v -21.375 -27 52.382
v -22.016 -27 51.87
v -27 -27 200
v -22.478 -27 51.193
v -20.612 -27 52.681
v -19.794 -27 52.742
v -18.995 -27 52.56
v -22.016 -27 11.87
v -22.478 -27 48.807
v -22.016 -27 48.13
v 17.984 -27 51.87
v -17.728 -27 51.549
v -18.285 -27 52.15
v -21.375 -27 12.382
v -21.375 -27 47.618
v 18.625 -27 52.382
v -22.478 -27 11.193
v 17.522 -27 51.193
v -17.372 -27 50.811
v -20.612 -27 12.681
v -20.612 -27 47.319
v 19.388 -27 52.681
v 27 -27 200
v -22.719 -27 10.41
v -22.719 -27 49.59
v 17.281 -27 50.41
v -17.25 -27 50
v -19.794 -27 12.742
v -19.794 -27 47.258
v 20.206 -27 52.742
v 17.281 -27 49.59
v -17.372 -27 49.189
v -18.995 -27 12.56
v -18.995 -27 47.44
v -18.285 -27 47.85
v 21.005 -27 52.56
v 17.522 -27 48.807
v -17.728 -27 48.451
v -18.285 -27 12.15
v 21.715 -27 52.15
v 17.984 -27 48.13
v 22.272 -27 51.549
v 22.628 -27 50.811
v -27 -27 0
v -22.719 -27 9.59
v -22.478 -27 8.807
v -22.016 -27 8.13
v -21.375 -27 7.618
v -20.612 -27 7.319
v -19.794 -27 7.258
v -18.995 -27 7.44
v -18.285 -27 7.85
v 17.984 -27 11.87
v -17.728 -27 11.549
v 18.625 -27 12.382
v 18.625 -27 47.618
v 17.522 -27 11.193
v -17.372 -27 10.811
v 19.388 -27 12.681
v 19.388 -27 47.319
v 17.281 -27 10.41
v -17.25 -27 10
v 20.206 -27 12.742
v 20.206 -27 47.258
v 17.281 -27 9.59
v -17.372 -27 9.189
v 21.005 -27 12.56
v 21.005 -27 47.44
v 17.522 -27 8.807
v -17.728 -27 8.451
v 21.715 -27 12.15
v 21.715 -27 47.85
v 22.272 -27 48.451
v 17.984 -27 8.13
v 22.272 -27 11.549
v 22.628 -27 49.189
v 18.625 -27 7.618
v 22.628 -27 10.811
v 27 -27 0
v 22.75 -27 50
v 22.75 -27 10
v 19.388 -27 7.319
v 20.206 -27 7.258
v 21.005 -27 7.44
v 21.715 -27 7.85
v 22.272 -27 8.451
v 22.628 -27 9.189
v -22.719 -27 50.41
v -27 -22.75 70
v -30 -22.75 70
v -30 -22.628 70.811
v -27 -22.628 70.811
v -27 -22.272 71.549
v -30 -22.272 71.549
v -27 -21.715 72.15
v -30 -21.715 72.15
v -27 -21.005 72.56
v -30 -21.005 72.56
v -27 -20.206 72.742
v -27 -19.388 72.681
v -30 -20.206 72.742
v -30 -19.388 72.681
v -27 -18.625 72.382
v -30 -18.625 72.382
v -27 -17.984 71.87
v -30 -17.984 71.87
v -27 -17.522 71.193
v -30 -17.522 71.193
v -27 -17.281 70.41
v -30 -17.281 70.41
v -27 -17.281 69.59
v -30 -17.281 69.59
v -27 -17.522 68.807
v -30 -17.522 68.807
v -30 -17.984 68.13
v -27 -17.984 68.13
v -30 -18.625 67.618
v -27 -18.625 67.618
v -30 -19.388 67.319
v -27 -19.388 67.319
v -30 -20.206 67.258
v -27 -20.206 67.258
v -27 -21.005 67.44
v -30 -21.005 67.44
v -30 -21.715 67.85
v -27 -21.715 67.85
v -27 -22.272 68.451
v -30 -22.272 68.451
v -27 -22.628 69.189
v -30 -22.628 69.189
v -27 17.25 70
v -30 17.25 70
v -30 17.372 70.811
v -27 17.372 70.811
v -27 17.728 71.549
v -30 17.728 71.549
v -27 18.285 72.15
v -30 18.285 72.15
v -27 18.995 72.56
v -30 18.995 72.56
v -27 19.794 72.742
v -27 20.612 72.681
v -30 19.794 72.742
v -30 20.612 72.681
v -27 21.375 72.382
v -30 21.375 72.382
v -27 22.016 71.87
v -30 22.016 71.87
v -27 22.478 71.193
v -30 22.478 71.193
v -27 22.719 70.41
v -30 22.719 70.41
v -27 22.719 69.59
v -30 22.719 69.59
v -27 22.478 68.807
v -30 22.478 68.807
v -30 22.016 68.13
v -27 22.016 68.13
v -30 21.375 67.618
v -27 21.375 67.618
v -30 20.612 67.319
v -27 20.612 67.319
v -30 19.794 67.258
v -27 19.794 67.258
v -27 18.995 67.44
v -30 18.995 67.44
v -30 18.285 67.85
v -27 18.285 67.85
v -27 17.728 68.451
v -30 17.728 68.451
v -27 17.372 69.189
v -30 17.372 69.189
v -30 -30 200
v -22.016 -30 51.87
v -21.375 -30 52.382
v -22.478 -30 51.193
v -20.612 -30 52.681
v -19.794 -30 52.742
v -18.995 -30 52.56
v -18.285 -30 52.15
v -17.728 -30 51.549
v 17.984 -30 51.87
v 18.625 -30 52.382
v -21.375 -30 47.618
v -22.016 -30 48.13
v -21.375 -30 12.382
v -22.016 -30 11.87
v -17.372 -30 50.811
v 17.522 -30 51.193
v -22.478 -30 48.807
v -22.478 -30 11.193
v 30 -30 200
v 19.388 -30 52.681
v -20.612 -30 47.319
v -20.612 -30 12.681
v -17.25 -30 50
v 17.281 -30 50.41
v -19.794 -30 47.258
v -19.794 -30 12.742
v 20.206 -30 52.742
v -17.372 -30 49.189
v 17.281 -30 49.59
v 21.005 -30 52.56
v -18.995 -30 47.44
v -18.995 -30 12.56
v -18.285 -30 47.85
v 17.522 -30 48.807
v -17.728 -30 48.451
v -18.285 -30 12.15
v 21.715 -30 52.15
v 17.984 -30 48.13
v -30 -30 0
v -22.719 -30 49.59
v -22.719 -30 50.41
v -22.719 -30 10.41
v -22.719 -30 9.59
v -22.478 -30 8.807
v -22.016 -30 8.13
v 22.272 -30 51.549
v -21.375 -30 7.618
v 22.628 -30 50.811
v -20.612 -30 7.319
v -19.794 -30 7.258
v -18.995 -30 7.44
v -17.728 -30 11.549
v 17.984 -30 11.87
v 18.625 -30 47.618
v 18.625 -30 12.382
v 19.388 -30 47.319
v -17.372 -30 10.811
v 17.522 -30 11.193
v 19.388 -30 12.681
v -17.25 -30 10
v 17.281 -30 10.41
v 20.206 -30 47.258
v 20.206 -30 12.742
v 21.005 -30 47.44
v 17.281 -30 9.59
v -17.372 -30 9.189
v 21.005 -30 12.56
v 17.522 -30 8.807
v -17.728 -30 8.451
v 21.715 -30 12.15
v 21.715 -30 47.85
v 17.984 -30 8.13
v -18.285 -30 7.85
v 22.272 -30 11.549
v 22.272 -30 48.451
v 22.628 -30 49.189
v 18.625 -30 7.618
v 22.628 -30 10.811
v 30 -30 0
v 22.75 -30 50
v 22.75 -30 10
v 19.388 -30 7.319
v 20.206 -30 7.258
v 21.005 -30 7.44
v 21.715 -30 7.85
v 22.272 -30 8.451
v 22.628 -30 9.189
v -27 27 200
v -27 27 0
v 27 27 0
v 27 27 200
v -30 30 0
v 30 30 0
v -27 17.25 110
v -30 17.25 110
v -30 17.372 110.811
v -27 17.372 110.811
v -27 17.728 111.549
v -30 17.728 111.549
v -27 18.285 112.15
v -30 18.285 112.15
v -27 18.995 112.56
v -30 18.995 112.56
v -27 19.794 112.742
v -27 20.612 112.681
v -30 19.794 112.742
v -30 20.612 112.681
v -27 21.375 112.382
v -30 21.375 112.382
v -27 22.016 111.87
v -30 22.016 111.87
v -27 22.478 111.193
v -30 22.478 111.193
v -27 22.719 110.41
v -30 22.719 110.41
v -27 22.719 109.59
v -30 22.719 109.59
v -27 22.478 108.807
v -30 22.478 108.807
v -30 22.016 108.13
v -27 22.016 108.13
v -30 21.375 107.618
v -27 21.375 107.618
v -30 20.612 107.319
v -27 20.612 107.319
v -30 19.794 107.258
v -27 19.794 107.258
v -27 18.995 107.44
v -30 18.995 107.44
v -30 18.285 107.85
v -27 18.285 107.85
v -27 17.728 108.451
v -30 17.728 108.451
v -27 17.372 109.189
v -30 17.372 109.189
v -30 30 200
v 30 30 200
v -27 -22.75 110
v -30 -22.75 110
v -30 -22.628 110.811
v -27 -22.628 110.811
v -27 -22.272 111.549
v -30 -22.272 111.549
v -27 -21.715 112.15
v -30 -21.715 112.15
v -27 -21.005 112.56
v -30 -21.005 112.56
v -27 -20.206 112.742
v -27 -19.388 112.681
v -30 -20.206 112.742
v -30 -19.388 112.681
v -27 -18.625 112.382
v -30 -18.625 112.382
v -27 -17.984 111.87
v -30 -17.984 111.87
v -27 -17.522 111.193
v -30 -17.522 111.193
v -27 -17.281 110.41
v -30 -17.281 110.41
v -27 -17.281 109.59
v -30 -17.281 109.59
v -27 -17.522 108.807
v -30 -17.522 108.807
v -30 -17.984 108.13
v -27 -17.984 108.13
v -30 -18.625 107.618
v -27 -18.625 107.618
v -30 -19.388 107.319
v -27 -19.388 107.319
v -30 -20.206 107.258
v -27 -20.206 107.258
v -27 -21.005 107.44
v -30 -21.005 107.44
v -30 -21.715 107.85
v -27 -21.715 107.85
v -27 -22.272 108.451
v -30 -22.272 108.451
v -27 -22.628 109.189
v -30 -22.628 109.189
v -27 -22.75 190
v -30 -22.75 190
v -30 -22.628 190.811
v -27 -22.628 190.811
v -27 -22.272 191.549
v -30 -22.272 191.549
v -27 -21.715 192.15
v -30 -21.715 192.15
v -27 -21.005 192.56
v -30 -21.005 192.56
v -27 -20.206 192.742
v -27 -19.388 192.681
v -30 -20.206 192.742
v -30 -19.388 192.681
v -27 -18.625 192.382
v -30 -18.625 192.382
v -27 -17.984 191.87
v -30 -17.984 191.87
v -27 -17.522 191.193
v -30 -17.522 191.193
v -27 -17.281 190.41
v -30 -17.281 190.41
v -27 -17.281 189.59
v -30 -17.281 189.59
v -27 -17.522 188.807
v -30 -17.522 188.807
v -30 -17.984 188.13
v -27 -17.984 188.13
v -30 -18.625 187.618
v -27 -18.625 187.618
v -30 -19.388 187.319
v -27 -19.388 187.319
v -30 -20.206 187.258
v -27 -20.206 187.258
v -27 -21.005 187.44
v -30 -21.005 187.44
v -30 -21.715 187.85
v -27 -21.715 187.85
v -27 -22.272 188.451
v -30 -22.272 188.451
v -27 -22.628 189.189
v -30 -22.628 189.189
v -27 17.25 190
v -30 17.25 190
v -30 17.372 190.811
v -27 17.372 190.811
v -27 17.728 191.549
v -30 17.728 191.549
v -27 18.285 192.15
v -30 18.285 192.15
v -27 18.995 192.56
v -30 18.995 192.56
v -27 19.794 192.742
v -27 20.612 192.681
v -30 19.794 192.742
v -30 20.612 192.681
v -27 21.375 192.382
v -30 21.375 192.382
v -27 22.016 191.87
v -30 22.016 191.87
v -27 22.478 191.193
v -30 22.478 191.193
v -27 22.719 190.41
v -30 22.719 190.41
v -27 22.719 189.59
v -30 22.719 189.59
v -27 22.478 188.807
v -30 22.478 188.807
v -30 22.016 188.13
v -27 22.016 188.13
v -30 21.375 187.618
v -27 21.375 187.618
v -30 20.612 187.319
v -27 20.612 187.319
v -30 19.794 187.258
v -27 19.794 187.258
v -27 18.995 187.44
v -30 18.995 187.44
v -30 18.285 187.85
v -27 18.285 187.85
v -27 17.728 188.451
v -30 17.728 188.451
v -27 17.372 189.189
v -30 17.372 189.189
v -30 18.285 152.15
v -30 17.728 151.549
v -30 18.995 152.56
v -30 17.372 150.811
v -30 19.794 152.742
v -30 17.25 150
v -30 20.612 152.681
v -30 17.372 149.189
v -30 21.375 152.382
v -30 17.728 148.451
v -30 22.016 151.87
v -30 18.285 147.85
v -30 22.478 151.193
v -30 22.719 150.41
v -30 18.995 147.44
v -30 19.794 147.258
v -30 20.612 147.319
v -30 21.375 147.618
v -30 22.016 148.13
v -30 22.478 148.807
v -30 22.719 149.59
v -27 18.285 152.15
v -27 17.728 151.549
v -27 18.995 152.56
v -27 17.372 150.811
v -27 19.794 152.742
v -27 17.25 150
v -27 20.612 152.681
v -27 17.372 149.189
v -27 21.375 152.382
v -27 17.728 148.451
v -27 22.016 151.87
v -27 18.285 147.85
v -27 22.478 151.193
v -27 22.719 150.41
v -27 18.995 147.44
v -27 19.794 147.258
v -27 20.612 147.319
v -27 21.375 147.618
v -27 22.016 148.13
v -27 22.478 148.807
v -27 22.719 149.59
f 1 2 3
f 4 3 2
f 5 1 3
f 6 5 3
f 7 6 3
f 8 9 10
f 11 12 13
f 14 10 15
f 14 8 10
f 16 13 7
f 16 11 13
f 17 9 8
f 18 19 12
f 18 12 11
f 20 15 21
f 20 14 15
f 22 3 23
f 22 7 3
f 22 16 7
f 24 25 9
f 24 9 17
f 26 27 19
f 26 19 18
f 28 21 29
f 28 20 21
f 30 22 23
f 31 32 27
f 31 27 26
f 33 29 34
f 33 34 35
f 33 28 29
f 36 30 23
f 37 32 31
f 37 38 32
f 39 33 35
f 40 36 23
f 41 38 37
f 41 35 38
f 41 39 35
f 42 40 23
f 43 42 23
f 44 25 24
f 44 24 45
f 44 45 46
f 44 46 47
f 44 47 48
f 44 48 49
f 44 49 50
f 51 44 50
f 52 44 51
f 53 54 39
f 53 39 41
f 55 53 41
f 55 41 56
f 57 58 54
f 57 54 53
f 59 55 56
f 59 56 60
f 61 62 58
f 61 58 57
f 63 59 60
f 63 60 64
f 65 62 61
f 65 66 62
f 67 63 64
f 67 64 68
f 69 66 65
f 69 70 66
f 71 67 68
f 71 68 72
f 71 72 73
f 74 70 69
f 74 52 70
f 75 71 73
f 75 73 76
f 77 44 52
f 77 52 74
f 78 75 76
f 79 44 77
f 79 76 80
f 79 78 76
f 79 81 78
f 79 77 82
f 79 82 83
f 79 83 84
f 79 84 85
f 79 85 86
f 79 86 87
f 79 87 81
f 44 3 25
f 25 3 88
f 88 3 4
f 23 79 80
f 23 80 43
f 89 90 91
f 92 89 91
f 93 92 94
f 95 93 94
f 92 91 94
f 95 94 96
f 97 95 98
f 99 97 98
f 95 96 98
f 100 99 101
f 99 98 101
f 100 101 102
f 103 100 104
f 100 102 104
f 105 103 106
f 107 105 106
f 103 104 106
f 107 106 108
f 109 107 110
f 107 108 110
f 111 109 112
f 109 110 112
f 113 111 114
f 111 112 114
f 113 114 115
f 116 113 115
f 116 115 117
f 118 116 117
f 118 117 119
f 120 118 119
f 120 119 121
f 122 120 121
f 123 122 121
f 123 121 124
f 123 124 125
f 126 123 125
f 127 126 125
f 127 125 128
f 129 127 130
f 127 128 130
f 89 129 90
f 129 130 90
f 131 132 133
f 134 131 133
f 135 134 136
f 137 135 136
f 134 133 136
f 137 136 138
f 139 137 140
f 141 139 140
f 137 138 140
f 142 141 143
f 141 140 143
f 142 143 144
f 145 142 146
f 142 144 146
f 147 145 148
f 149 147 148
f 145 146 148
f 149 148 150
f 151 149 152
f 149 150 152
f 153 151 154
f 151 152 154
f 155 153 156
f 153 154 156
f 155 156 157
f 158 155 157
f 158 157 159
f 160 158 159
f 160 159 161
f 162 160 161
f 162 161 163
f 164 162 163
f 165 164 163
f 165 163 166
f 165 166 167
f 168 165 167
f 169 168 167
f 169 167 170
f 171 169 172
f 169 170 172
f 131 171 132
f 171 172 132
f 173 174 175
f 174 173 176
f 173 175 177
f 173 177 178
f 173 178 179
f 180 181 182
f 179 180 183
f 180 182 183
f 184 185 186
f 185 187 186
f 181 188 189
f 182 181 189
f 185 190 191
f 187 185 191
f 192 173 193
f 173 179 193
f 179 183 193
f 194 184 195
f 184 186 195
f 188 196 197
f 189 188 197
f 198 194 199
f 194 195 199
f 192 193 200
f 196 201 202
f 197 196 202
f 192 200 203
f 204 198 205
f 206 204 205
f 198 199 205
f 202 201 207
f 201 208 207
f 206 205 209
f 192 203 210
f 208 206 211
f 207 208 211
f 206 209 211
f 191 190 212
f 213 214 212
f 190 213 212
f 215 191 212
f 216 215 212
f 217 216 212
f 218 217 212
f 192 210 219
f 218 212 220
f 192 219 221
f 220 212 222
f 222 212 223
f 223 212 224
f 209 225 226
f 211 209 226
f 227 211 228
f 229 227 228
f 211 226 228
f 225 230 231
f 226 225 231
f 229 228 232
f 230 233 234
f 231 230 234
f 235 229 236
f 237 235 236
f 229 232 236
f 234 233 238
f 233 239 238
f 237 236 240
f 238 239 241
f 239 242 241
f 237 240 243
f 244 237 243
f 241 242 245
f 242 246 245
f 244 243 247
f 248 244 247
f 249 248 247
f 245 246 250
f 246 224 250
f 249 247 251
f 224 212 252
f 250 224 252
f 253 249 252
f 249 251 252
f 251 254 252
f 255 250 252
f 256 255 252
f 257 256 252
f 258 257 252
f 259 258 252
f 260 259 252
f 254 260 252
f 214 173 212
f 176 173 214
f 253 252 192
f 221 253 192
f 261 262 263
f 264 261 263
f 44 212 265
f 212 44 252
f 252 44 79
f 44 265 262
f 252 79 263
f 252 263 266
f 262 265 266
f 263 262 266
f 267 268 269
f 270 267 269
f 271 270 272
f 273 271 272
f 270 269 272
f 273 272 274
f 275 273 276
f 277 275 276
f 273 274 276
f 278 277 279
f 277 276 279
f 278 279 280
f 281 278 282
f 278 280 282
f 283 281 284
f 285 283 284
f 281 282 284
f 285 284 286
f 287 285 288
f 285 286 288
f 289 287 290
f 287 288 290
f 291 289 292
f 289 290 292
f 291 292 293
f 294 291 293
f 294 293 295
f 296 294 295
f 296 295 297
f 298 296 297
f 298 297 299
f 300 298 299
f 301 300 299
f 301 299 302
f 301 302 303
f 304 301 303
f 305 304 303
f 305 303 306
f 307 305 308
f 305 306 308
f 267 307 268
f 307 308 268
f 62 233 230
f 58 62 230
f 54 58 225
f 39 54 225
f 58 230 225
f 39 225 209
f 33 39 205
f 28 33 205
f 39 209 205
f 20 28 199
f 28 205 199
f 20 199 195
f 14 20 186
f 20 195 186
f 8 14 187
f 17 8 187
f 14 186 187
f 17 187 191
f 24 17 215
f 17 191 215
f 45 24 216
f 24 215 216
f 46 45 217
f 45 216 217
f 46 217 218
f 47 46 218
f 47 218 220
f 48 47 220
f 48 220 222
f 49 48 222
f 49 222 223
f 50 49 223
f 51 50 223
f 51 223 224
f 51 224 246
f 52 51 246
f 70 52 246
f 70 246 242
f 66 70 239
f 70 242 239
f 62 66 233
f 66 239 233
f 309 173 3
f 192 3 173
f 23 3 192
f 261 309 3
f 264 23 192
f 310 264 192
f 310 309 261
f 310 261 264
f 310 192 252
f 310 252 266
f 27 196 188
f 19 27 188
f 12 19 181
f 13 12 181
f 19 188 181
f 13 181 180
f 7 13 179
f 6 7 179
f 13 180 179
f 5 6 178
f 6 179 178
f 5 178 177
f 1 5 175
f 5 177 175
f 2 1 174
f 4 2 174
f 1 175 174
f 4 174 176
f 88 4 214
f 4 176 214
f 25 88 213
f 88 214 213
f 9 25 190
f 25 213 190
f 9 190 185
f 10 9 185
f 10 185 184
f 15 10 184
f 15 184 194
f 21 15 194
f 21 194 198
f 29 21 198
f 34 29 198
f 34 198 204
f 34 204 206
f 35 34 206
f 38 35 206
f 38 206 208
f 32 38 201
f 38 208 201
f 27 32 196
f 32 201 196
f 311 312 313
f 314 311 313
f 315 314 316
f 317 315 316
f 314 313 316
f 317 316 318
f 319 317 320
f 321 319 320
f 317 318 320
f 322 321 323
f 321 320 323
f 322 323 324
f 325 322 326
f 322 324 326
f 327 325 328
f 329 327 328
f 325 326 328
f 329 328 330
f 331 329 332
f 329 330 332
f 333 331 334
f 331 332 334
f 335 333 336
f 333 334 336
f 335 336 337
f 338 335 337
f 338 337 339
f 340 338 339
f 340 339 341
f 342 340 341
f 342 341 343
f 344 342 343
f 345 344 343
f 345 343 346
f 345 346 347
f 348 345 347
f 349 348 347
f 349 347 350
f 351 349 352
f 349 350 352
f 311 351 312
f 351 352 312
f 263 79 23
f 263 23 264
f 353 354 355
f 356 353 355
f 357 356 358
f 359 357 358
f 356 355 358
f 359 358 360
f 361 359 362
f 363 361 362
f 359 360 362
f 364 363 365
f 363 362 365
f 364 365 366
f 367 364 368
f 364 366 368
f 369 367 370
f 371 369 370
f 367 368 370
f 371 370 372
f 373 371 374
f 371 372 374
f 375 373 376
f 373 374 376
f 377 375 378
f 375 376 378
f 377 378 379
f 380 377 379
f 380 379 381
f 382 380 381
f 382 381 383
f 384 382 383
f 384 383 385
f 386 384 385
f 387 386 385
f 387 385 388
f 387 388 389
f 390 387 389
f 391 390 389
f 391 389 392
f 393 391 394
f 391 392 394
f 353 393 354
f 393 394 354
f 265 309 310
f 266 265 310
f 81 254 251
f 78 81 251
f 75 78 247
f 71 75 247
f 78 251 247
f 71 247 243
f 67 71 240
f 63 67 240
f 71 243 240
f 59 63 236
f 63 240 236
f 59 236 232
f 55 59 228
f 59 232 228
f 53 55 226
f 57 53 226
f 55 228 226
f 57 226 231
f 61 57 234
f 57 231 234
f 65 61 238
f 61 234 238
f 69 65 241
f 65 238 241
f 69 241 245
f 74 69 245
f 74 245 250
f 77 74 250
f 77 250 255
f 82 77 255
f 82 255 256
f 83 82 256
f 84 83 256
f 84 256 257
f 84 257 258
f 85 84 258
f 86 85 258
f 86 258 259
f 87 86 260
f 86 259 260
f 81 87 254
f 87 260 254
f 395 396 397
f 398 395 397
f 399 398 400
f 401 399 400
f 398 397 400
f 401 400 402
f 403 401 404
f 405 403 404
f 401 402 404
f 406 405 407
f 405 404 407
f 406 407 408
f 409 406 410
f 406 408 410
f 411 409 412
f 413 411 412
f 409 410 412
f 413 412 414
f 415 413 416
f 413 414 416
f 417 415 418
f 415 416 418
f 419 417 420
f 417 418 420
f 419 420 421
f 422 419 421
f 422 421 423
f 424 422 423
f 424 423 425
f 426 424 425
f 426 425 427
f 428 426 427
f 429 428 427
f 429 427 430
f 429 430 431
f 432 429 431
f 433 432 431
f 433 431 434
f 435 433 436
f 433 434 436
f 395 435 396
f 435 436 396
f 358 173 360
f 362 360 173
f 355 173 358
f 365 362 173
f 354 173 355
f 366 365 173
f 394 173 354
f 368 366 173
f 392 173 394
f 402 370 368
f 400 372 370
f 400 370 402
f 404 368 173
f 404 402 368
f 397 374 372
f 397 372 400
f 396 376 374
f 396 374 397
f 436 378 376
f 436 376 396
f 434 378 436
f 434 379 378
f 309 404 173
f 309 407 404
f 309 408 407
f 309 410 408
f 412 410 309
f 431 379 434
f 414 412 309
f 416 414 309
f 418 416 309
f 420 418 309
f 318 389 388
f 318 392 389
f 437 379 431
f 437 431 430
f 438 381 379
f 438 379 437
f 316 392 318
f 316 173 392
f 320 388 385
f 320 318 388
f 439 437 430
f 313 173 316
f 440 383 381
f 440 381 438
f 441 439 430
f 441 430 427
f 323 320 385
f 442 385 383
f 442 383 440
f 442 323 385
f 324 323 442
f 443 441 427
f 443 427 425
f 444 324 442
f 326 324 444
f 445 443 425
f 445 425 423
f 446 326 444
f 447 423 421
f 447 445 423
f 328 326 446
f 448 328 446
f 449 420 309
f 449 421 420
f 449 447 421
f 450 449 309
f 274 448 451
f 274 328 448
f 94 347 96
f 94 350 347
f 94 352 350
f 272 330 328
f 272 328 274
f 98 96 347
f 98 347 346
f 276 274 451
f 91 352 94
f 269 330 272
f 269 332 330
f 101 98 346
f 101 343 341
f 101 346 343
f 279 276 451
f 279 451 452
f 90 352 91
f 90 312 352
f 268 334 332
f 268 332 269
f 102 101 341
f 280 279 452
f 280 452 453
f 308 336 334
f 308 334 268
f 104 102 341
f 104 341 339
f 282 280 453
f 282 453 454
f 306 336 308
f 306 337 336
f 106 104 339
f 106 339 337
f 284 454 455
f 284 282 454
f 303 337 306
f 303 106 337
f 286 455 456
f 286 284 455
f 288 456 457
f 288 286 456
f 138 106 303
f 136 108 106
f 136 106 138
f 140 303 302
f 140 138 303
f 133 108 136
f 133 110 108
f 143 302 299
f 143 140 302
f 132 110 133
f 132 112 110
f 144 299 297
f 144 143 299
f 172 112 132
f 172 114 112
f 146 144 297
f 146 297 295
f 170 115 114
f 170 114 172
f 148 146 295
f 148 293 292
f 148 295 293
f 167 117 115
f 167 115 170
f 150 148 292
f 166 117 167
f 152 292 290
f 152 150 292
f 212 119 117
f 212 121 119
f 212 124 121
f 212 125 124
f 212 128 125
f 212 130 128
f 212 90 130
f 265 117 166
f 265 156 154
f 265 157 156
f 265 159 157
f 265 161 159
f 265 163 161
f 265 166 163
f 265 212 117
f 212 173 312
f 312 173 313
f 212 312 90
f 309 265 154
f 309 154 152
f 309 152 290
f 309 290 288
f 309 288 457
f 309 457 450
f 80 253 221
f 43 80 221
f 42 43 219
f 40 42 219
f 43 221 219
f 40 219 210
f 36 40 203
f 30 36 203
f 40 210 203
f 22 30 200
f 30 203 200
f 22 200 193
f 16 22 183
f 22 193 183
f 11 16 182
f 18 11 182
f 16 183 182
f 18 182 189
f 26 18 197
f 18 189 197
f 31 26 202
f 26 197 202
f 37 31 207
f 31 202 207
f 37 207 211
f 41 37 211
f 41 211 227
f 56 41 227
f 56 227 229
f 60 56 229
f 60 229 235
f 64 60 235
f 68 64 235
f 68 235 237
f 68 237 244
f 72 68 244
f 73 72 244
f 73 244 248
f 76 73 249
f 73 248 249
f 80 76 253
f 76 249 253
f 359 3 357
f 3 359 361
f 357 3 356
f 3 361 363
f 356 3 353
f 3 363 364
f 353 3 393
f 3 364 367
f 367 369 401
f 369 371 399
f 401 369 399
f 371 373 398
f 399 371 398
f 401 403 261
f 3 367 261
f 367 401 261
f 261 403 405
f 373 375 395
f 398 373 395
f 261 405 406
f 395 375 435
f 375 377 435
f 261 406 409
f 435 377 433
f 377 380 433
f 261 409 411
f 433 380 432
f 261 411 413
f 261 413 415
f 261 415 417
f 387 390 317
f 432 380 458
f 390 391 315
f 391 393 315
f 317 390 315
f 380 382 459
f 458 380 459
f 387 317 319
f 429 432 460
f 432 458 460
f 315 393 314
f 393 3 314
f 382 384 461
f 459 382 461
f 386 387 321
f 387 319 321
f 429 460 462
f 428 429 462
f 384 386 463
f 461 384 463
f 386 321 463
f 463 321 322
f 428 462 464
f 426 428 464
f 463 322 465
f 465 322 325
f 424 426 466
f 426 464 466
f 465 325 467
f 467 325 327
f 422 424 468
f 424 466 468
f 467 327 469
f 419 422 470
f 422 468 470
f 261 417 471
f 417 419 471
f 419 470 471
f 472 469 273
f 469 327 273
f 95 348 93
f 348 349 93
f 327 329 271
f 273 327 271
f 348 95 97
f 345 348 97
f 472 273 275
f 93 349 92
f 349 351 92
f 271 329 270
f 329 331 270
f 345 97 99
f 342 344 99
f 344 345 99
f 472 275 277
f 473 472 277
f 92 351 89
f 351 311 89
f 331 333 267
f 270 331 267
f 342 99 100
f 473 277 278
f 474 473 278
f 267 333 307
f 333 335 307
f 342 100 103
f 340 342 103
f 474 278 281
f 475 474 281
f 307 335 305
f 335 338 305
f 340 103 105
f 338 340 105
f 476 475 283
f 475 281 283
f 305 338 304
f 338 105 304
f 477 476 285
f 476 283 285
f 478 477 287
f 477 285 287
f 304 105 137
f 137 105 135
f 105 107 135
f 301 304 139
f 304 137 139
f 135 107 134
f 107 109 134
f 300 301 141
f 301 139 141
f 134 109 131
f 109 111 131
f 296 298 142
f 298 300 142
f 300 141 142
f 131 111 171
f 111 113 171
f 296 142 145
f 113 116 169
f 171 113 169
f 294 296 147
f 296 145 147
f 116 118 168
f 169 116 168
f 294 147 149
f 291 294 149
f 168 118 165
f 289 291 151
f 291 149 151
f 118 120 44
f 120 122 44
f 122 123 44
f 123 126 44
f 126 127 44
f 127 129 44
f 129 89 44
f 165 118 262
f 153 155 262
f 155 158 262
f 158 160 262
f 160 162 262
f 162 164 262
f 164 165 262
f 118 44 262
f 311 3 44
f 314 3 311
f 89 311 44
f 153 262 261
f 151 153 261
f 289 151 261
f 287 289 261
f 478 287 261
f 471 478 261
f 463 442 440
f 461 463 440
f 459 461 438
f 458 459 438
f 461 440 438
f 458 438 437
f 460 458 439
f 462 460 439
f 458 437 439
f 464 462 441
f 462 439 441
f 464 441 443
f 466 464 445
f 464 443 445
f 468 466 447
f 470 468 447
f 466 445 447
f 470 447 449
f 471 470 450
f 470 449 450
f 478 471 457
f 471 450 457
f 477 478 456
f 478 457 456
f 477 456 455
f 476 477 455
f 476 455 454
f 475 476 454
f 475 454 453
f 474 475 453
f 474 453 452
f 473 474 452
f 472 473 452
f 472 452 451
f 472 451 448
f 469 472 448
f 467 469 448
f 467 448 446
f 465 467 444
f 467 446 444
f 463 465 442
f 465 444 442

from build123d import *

# Parameters (mm, degrees)
SKETCH_W        = 60
SKETCH_H        = 60
SKETCH_W_2      = 54
SKETCH_H_2      = 54
PAD_DEPTH       = 200
SKETCH001_R     = 2.75
POCKET_DEPTH    = 3
SKETCH002_R     = 2.75
POCKET001_DEPTH = 3


with BuildPart() as part:
    # Sketch → Pad (new body)
    with BuildSketch(Plane.XY):
        Rectangle(SKETCH_W, SKETCH_H)
        Rectangle(SKETCH_W_2, SKETCH_H_2, mode=Mode.SUBTRACT)
    extrude(amount=PAD_DEPTH)

    # Sketch001 (on Face3 of Pad) → Pocket (cut)
    with BuildSketch(Plane.XZ.offset(30)):
        with Locations((-20, 50)):
            Circle(SKETCH001_R)
        with Locations((20, 50)):
            Circle(SKETCH001_R)
        with Locations((-20, 10)):
            Circle(SKETCH001_R)
        with Locations((20, 10)):
            Circle(SKETCH001_R)
    extrude(amount=-POCKET_DEPTH, mode=Mode.SUBTRACT)

    # Sketch002 (on Face2 of Pocket) → Pocket001 (cut)
    with BuildSketch(Plane(origin=(-30, 0, 0), x_dir=(0, -1, 0), z_dir=(-1, 0, 0))):
        with Locations((-20, 190)):
            Circle(SKETCH002_R)
        with Locations((20, 190)):
            Circle(SKETCH002_R)
        with Locations((-20, 150)):
            Circle(SKETCH002_R)
        with Locations((-60, 150)):
            Circle(SKETCH002_R)
        with Locations((-20, 110)):
            Circle(SKETCH002_R)
        with Locations((20, 110)):
            Circle(SKETCH002_R)
        with Locations((-20, 70)):
            Circle(SKETCH002_R)
        with Locations((20, 70)):
            Circle(SKETCH002_R)
    extrude(amount=-POCKET001_DEPTH, mode=Mode.SUBTRACT)


solid = part.part
